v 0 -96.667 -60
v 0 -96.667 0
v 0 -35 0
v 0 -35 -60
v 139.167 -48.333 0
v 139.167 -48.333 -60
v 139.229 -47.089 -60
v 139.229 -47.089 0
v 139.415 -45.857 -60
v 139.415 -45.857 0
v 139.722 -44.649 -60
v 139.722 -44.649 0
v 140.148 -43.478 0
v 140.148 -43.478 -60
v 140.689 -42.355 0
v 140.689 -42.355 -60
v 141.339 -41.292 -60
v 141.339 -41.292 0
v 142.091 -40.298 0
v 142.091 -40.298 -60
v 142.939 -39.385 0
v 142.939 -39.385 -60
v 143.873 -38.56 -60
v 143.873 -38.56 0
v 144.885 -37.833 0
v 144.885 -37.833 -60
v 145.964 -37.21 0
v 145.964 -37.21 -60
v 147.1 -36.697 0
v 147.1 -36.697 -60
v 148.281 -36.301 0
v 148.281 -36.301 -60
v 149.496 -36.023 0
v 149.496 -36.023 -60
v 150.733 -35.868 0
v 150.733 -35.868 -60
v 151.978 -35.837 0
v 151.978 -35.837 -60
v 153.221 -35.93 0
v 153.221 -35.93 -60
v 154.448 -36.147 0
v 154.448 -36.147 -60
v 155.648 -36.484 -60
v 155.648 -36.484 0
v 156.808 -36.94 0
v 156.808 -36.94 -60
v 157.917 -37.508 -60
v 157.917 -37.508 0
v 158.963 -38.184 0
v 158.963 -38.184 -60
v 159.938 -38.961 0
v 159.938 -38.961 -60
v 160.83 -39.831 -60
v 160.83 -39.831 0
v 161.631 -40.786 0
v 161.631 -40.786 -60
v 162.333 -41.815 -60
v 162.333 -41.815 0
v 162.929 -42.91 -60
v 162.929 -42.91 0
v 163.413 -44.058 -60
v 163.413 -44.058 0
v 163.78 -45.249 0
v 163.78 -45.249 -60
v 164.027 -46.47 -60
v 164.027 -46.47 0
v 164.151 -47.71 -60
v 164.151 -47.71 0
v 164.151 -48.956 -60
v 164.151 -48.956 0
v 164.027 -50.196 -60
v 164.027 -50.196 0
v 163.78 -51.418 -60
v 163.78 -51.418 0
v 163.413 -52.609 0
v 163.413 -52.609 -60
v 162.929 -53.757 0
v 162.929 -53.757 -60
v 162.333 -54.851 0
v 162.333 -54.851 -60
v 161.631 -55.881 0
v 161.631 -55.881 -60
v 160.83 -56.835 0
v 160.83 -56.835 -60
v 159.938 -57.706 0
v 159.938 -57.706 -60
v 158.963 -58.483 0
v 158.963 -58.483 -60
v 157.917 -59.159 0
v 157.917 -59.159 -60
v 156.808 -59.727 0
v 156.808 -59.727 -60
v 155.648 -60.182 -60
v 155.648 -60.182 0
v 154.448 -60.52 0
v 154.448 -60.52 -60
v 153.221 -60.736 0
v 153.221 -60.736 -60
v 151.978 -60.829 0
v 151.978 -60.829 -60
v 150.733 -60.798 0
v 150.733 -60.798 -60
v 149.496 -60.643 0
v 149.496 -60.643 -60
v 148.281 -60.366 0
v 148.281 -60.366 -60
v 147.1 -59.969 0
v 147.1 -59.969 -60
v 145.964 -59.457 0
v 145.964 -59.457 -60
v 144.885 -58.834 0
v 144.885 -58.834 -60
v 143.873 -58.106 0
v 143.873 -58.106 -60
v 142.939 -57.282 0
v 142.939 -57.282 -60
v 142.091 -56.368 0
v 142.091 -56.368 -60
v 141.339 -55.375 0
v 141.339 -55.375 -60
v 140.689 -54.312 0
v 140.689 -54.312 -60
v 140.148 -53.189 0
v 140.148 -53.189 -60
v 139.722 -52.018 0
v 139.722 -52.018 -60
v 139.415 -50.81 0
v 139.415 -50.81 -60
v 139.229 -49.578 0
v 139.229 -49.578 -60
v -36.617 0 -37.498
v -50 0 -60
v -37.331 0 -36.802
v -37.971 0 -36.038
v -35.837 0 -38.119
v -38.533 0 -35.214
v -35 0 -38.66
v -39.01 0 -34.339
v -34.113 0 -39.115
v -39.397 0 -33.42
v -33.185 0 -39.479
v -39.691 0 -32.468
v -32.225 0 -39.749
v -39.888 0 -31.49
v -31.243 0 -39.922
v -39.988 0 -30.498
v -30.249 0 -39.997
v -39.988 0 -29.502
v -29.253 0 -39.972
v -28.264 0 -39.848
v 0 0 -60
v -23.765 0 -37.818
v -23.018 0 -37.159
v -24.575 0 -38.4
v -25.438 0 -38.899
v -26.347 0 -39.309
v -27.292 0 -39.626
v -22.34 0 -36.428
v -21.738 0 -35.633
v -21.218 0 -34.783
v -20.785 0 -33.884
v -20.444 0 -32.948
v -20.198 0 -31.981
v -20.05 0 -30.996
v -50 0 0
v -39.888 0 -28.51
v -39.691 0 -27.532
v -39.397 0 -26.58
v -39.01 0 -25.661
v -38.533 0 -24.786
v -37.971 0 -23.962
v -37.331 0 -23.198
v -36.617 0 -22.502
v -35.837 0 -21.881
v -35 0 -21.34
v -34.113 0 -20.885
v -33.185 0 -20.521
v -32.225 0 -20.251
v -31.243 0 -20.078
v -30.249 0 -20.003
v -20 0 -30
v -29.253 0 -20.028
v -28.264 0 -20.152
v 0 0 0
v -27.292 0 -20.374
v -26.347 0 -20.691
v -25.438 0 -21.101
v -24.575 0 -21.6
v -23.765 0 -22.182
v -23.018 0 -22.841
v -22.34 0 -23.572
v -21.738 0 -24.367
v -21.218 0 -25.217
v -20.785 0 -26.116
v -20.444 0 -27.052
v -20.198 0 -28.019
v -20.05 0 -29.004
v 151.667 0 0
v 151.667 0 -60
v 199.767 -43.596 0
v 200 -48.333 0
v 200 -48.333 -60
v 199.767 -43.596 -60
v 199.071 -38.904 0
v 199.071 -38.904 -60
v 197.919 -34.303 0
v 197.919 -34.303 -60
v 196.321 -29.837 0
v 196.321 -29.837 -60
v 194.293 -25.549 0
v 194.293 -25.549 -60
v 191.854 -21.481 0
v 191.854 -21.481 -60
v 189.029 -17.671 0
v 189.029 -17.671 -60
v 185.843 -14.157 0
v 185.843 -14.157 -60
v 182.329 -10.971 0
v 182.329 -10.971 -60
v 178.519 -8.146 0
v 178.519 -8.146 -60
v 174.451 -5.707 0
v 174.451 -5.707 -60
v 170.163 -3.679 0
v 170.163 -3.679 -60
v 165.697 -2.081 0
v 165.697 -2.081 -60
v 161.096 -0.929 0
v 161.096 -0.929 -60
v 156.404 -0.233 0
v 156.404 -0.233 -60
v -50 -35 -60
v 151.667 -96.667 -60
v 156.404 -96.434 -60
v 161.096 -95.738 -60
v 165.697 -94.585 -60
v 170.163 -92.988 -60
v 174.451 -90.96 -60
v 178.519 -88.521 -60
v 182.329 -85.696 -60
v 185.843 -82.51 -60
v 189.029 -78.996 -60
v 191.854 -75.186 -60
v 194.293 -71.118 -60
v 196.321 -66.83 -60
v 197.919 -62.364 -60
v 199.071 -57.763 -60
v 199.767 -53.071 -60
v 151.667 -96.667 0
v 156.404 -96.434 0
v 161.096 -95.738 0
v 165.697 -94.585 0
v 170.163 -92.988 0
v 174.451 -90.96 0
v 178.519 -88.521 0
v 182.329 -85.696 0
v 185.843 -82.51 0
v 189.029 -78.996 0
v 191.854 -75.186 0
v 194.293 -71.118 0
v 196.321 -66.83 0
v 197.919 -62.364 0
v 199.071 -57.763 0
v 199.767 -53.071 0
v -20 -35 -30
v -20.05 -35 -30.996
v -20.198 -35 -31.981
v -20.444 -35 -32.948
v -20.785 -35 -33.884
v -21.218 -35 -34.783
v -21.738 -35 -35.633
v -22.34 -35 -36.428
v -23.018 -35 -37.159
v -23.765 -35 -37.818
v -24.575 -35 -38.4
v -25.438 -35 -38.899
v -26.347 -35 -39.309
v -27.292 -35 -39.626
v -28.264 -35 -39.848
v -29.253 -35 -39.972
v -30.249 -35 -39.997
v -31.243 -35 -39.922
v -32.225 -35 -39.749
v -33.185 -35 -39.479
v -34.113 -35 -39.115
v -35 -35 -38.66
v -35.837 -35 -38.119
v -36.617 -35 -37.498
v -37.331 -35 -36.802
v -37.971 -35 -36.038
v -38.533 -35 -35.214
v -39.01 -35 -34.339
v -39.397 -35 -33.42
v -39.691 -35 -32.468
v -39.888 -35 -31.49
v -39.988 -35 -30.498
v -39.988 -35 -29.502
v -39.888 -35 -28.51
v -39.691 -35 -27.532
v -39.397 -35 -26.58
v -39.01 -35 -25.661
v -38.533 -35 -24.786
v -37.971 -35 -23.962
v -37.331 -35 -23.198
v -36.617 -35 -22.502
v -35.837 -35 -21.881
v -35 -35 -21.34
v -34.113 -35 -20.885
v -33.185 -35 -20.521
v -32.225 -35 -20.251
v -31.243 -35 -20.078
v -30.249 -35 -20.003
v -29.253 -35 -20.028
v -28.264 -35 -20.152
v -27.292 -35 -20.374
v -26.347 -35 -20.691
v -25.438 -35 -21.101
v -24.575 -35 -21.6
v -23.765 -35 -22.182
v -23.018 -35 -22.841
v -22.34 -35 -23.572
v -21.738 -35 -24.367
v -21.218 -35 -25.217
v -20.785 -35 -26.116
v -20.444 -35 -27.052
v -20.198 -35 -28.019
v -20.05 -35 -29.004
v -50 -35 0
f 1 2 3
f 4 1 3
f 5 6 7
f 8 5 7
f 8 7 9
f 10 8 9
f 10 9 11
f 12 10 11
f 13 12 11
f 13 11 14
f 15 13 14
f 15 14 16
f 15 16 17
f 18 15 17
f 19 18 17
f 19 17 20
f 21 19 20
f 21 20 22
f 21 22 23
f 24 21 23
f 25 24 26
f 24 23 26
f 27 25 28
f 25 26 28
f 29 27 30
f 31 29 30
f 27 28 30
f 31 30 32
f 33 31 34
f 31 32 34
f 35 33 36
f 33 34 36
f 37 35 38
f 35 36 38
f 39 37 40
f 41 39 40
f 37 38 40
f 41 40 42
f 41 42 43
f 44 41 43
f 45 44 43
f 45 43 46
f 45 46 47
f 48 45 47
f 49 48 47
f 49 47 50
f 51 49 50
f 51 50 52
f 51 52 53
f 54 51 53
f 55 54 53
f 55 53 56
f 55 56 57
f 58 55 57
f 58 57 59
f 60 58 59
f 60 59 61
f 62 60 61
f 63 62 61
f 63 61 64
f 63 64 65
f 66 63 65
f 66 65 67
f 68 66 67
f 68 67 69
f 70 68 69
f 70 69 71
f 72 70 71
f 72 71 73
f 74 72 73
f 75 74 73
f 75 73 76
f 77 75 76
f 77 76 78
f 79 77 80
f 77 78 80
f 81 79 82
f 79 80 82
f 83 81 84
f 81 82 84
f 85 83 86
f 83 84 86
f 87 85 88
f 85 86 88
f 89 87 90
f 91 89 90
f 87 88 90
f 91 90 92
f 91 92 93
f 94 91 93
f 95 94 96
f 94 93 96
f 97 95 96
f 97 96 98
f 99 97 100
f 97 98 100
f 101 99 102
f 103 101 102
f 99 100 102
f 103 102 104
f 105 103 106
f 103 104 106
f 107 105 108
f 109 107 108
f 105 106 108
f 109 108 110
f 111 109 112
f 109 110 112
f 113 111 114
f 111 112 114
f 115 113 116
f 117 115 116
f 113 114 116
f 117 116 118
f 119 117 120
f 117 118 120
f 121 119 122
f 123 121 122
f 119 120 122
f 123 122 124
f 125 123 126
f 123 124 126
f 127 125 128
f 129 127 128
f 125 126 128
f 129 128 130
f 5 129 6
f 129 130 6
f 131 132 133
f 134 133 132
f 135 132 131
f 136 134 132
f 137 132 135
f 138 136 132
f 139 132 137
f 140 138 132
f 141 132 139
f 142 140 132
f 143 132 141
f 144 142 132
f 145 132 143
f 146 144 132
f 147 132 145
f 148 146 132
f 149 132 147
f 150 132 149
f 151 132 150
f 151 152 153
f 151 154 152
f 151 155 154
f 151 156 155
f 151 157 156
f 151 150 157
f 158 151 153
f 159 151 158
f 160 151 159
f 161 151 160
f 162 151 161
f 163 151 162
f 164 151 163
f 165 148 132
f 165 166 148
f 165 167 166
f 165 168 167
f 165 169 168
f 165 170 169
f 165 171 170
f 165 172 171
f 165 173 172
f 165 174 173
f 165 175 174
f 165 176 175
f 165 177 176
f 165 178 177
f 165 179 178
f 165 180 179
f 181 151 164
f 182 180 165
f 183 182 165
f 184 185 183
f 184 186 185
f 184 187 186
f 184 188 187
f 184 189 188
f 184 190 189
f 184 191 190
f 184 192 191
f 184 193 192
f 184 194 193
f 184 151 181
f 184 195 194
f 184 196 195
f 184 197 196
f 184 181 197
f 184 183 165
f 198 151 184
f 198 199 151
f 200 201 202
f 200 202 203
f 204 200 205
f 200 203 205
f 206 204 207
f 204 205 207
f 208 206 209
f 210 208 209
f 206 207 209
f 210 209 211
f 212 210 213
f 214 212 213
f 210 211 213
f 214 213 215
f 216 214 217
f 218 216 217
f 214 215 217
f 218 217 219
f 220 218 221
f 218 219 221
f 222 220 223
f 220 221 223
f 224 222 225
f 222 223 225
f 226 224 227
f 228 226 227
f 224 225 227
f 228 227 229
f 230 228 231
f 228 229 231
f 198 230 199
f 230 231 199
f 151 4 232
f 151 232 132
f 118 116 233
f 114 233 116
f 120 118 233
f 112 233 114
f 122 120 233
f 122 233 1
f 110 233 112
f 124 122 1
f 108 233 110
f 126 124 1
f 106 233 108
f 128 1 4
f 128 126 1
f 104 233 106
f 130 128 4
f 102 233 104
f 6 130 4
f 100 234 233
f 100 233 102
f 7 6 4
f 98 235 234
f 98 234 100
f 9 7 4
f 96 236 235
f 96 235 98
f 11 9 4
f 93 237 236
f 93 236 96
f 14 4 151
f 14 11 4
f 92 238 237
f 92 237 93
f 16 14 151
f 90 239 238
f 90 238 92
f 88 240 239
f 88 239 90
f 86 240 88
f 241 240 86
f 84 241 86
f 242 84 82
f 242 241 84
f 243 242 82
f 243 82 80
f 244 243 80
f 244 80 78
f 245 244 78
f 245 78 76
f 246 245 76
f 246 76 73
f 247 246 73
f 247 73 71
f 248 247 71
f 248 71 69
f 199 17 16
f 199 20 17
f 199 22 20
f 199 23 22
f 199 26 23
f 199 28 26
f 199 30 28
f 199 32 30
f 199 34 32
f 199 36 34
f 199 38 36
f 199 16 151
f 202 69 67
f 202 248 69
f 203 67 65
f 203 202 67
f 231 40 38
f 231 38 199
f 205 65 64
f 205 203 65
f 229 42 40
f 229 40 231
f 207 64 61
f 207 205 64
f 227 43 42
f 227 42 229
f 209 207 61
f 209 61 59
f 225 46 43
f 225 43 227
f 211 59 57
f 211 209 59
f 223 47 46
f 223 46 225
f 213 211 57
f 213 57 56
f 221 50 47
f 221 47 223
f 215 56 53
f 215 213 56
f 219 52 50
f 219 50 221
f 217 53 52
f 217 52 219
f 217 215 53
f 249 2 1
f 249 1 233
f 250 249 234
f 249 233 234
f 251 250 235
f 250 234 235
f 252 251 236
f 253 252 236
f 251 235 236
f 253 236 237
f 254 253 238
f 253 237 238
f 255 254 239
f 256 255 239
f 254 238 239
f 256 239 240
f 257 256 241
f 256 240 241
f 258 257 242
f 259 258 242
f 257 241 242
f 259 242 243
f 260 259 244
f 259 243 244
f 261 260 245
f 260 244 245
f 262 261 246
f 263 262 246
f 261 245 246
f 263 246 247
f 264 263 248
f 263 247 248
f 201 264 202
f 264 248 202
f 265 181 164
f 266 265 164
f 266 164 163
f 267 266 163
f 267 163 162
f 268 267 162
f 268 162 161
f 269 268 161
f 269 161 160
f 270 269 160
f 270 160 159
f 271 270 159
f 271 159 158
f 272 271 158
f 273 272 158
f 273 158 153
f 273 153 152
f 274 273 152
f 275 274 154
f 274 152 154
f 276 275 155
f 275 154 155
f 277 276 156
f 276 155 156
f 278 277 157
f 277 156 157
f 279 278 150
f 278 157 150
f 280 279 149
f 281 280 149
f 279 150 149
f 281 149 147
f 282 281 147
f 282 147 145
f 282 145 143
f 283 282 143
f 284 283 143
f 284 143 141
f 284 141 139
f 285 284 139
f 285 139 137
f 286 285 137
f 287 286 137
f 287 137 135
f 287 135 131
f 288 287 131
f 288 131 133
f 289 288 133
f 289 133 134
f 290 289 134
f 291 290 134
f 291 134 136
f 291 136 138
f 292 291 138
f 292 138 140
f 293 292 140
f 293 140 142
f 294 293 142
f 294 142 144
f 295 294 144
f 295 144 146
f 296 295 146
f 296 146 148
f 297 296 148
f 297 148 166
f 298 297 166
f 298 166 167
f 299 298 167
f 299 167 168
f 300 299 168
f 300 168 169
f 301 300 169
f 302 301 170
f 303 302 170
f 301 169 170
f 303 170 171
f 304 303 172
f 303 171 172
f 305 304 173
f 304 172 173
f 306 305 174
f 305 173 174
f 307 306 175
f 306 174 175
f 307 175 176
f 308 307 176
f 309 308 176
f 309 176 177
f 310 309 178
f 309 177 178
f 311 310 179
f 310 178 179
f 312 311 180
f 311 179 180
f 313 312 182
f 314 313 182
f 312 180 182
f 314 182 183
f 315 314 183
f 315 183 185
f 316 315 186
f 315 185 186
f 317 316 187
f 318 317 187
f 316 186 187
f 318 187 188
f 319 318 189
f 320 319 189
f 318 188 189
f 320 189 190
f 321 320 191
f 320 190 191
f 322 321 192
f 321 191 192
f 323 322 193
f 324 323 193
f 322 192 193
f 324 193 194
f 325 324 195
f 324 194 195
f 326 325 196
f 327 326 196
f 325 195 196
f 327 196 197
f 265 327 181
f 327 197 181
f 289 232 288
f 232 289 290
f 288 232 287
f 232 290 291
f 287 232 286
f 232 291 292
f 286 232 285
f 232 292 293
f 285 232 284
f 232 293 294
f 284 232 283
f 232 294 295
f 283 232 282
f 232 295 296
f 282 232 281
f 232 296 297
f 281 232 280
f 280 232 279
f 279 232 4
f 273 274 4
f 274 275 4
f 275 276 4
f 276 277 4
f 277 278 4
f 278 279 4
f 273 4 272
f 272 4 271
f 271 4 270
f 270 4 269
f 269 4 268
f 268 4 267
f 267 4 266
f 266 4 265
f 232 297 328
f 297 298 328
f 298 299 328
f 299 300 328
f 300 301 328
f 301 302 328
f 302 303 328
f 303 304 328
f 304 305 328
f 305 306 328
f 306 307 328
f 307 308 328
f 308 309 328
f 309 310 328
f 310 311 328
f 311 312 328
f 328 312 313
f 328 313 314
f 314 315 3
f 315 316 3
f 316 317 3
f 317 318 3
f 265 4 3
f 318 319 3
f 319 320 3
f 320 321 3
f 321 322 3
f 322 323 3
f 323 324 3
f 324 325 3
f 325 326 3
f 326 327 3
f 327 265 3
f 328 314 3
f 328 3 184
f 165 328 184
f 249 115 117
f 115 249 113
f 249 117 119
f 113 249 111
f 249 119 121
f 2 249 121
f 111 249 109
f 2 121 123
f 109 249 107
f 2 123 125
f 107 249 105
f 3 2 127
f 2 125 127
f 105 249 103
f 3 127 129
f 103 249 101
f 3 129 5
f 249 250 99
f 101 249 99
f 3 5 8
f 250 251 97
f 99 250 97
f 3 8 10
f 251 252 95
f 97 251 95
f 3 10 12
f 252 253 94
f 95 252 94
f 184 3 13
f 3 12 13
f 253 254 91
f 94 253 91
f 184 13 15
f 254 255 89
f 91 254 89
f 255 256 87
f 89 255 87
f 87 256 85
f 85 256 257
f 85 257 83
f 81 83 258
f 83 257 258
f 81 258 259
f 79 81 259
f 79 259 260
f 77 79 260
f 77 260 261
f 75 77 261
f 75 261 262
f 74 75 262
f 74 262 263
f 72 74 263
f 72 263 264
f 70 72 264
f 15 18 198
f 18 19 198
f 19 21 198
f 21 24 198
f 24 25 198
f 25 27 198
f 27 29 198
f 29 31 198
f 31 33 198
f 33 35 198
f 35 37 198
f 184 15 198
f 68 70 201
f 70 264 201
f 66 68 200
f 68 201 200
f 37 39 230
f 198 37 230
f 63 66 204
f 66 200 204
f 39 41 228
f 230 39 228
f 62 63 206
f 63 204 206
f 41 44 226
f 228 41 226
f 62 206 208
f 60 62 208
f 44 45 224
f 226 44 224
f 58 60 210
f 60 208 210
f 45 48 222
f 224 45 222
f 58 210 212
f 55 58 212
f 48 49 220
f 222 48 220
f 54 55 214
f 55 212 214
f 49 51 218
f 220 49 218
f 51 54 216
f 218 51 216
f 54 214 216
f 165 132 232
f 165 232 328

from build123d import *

# Parameters (mm, degrees)
SKETCH2_W           = 200
SKETCH2_H           = 96.666666667
BOSS_EXTRUDE2_DEPTH = 60
FILLET12_R          = 48.333333
SKETCH6_R           = 12.5
CUT_EXTRUDE3_DEPTH  = 61
SKETCH8_W           = 60
SKETCH8_H           = 35
BOSS_EXTRUDE3_DEPTH = 50
SKETCH10_R          = 10
CUT_EXTRUDE4_DEPTH  = 50


with BuildPart() as part:
    # Sketch2 → Boss-Extrude2 (new body)
    with BuildSketch(Plane.XY):
        with Locations((100, -48.333333334)):
            Rectangle(SKETCH2_W, SKETCH2_H)
    extrude(amount=-BOSS_EXTRUDE2_DEPTH)

    # Fillet12
    fillet12_edges = [part.edges().sort_by_distance(p)[0] for p in [
        (200, 0, -30),
        (200, -96.666666667, -30),
    ]]
    fillet(fillet12_edges, radius=FILLET12_R)

    # Sketch6 → Cut-Extrude3 (cut, through all)
    with BuildSketch(Plane(origin=(0, 0, -60), x_dir=(-1, 0, 0), z_dir=(0, 0, -1))):
        with Locations((-151.666666667, -48.333333333)):
            Circle(SKETCH6_R)
    extrude(amount=-CUT_EXTRUDE3_DEPTH, mode=Mode.SUBTRACT)

    # Sketch8 → Boss-Extrude3 (add)
    with BuildSketch(Plane.ZY):
        with Locations((-30, -17.5)):
            Rectangle(SKETCH8_W, SKETCH8_H)
    extrude(amount=BOSS_EXTRUDE3_DEPTH)

    # Sketch10 → Cut-Extrude4 (cut)
    with BuildSketch(Plane(origin=(0, 0, 0), x_dir=(1, 0, 0), z_dir=(0, 1, 0))):
        with Locations((-30, 30)):
            Circle(SKETCH10_R)
    extrude(amount=-CUT_EXTRUDE4_DEPTH, mode=Mode.SUBTRACT)


solid = part.part
